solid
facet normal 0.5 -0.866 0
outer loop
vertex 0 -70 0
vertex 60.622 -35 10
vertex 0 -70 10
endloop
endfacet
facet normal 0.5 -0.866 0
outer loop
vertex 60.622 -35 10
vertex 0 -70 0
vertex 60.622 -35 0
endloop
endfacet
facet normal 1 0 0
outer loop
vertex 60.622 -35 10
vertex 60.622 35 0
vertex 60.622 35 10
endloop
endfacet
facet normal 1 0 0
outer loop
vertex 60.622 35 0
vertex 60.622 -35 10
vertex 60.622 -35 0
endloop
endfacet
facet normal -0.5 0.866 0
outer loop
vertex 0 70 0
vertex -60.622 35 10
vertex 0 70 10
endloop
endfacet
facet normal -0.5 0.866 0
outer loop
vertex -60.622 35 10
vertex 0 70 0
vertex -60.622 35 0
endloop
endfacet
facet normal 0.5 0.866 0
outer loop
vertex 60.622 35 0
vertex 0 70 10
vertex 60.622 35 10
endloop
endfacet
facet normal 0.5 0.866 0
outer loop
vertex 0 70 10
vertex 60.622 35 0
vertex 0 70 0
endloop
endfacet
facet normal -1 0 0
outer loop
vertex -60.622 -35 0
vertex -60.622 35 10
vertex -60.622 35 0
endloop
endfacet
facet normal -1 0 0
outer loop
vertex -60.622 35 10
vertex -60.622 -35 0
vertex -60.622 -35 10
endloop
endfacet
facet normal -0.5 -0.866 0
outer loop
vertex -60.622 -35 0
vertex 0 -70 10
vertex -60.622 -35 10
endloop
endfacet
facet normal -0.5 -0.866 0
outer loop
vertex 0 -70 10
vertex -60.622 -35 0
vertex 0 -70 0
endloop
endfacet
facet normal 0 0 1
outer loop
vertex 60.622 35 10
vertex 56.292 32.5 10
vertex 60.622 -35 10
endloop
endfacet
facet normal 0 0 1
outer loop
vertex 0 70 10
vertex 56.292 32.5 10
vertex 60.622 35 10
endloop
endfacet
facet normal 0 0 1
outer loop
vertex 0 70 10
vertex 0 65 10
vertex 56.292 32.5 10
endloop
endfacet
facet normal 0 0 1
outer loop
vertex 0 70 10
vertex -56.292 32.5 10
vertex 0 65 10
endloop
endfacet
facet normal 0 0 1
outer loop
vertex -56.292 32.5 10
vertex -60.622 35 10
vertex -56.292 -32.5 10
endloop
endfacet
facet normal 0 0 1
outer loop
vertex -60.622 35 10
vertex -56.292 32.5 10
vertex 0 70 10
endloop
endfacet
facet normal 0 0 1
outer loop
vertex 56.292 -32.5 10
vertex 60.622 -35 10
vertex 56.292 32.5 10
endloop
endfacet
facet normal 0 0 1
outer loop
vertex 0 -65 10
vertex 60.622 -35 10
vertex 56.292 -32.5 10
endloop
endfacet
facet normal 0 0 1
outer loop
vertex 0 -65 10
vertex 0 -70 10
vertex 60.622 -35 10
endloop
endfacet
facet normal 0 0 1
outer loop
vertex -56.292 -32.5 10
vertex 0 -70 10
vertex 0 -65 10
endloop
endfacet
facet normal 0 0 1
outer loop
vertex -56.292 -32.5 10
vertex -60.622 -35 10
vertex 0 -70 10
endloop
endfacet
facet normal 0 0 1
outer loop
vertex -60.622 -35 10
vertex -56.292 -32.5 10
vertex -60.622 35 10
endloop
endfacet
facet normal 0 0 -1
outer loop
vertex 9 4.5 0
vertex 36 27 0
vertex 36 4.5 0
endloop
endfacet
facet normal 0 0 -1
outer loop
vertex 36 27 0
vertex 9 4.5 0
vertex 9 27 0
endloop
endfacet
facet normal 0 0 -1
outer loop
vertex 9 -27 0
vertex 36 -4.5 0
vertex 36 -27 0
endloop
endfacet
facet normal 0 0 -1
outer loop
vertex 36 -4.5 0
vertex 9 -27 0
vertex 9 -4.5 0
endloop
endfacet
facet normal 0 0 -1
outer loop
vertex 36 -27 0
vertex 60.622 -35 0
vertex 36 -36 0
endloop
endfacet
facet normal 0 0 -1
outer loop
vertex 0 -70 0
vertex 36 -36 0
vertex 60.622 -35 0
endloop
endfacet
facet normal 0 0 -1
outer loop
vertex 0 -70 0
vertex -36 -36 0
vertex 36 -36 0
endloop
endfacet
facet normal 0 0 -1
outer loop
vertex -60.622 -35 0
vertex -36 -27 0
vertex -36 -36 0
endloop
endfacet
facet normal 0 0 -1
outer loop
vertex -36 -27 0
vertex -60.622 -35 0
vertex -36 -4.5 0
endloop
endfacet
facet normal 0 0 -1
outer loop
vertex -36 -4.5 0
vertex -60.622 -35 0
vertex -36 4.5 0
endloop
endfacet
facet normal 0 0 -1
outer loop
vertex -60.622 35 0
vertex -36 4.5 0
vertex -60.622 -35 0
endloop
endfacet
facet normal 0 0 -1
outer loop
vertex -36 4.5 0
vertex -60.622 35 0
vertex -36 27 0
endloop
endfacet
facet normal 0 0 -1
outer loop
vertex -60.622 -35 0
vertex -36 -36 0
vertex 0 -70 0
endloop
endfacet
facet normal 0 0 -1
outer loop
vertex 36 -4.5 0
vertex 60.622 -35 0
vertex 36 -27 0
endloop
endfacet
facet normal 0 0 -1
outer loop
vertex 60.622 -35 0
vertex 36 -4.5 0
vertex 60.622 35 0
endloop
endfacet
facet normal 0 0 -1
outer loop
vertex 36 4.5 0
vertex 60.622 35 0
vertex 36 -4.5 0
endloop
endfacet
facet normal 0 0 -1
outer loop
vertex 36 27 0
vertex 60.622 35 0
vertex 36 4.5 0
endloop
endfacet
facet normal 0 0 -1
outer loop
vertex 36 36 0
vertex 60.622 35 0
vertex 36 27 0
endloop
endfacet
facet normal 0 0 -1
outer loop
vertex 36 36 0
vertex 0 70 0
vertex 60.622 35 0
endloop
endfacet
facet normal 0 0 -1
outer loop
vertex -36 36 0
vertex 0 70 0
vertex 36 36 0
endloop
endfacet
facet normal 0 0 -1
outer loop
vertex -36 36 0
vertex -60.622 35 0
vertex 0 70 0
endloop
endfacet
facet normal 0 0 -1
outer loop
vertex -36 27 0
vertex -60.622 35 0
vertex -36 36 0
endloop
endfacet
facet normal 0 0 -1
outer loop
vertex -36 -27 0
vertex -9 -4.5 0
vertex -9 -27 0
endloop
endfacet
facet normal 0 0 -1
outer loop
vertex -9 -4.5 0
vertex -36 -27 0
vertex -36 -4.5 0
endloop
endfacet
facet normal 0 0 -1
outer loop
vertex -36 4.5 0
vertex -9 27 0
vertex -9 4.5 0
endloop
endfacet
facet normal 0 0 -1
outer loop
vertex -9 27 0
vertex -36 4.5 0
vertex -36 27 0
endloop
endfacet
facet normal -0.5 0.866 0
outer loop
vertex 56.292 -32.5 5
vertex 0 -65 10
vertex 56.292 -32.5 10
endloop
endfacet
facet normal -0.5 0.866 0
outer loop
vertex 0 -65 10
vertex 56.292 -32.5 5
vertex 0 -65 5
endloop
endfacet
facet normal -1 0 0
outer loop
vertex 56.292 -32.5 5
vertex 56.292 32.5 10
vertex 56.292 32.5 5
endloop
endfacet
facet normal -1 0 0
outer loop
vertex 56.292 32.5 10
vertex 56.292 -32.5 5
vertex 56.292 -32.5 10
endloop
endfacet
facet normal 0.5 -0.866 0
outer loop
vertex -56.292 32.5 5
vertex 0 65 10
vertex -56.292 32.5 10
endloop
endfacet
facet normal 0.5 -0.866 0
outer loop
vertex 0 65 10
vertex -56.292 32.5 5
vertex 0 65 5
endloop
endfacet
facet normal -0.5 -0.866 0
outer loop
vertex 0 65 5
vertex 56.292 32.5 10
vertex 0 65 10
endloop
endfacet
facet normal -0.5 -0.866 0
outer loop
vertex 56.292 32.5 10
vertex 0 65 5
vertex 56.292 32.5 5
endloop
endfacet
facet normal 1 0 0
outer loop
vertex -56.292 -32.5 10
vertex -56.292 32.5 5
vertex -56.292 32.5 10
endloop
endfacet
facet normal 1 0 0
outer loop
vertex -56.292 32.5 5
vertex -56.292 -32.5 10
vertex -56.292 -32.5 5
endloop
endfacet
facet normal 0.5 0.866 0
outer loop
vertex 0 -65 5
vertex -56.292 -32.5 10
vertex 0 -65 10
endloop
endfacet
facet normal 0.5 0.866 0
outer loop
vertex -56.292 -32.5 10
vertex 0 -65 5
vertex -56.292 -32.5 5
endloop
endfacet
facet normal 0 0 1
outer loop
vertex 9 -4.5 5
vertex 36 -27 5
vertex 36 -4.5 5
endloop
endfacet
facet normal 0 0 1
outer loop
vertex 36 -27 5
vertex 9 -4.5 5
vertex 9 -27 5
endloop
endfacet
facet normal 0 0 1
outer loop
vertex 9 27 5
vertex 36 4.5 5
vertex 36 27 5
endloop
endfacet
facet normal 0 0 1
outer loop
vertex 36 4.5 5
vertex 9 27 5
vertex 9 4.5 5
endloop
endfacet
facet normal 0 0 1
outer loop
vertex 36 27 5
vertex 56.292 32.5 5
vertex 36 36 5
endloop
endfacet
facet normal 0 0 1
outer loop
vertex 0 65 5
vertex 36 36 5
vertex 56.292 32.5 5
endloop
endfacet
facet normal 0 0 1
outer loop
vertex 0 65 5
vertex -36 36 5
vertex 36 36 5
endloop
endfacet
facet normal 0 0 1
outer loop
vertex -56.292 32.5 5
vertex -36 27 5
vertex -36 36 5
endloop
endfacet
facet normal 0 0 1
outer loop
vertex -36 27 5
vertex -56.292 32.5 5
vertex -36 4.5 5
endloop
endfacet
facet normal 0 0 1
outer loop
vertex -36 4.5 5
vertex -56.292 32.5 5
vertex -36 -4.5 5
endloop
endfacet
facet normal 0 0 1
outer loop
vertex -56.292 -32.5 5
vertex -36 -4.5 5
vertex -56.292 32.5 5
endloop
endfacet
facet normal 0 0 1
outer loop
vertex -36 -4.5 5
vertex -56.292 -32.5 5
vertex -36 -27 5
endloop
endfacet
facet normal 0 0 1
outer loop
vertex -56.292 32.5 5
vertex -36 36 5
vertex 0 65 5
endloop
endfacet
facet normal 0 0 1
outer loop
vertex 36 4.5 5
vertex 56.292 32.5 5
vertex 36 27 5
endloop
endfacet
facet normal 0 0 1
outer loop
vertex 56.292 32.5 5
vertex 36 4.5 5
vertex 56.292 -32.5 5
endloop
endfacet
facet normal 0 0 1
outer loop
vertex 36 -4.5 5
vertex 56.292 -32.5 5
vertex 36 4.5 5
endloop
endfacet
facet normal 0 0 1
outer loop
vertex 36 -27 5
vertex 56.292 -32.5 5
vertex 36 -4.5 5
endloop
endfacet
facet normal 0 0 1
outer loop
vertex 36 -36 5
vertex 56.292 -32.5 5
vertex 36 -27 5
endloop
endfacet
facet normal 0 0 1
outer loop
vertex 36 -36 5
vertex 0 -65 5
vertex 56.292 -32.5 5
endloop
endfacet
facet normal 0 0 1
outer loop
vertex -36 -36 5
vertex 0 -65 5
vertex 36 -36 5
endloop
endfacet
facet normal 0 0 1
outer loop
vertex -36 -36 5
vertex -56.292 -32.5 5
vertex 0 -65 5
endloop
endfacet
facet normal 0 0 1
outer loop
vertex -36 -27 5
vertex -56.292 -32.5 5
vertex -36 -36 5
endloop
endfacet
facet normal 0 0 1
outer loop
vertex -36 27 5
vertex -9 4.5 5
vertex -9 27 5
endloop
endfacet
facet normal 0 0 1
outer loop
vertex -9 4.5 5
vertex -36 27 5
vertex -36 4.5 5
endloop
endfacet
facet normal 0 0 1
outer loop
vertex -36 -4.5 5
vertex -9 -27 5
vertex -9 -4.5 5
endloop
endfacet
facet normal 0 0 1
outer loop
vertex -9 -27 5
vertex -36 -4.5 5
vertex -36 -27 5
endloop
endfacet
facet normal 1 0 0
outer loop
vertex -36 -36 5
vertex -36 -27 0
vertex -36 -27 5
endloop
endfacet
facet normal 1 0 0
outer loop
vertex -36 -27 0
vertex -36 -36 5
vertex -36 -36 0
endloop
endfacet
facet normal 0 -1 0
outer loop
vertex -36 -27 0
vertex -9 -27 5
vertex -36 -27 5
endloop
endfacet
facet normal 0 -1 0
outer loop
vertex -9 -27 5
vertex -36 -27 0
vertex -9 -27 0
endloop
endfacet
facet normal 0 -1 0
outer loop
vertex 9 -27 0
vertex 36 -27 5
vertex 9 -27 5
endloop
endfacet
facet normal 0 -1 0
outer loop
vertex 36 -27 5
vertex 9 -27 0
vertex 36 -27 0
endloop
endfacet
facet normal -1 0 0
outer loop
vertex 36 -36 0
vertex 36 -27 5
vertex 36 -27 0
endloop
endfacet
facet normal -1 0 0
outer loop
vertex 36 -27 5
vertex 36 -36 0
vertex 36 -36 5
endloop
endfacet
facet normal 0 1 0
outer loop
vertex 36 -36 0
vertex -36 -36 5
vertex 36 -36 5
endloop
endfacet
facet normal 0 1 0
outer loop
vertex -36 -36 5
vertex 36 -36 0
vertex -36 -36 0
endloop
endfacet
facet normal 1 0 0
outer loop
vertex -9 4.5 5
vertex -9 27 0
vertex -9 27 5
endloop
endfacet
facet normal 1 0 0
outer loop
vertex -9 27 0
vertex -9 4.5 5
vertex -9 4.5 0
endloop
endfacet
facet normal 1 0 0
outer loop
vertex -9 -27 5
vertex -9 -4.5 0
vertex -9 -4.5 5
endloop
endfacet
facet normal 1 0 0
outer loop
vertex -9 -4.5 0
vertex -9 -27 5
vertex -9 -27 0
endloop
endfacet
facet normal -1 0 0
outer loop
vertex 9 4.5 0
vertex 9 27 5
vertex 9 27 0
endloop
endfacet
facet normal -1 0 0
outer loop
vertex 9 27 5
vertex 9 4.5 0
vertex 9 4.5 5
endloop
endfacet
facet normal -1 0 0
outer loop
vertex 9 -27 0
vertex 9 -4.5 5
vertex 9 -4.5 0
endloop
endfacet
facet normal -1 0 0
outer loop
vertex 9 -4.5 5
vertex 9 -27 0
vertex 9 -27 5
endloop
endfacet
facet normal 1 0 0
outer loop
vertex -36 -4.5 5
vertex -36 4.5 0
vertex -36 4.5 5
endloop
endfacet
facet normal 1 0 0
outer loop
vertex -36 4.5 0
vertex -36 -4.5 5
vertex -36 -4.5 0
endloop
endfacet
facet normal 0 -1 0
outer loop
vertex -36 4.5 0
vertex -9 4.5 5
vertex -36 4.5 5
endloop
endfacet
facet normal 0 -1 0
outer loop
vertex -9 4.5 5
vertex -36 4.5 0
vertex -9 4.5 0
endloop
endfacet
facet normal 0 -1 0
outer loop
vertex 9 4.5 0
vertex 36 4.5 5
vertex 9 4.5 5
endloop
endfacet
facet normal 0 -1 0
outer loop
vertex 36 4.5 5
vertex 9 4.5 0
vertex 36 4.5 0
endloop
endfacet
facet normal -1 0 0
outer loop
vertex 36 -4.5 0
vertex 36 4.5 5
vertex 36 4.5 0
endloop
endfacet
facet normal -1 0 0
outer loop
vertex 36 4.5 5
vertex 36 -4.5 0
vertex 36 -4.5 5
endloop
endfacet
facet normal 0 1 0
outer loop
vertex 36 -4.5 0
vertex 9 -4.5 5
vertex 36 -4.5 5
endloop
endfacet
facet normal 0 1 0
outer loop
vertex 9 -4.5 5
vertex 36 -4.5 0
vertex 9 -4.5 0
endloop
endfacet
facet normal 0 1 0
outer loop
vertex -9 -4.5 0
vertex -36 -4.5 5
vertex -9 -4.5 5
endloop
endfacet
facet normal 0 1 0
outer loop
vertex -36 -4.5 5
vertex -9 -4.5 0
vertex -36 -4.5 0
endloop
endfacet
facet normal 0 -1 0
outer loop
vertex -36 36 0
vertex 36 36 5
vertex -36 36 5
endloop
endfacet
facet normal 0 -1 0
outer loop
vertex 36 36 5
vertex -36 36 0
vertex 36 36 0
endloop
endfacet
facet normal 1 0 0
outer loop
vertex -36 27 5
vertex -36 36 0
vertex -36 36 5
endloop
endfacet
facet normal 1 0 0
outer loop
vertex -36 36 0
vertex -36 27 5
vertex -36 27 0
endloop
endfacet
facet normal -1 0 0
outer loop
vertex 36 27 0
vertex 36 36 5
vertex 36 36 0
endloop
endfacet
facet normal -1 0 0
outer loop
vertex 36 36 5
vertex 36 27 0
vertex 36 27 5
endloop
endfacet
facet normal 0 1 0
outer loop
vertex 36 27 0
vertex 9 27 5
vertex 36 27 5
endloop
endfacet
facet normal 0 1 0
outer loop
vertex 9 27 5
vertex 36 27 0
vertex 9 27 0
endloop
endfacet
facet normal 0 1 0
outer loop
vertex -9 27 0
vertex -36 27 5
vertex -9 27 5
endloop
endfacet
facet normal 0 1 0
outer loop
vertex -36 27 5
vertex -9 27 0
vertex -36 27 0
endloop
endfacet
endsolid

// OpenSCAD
// Spacelab hexagons riddle
hex_radius=70;
hex_height=10;
hex_frame_height=5;
hex_frame_width=5;
display_digit=3;
digit_scale=4.5;

ptSegment = [                                                                   
    [ [-0, 0], [-8, 0], [-8, 2], [-0, 2] ],                    
    [ [-6, 0], [-6, 8], [-8, 8], [-8, 0] ],                    
    [ [-0, 0], [-0, 8], [-2, 8], [-2, 0] ],                    
    [ [-0, 7], [-0, 9], [-8, 9], [-8, 7] ],                    
    [ [-6, 8], [-6, 16], [-8, 16], [-8, 8] ],                    
    [ [-0, 8], [-0, 16], [-2, 16], [-2, 8] ],                    
    [ [-0, 14], [-8, 14], [-8, 16], [-0, 16] ],                    
]; 

fSevenSegment = [
    [1,1,1,0,1,1,1],                // 0
    [0,0,1,0,0,1,0],                // 1
    [1,1,0,1,0,1,1],                // 2
    [1,0,1,1,0,1,1],                // 3
    [0,0,1,1,1,1,0],                // 4
    [1,0,1,1,1,0,1],                // 5
    [1,1,1,1,1,0,1],                // 6
    [0,0,1,0,0,1,1],                // 7
    [1,1,1,1,1,1,1],                // 8
    [1,0,1,1,1,1,1]                 // 9
];

module DisplayMirroredDigit(number, scaling, height) {
    for (iSeg = [0:6]) {
        if (fSevenSegment[number][iSeg] > 0) {
            linear_extrude(height=height)
            scale([scaling, scaling, scaling]){
                translate([0, -8]){
                    mirror([1, 0, 0])
                    polygon(points=ptSegment[iSeg]);
                    polygon(points=ptSegment[iSeg]);
                }
            }
        }
    }
}

// Base shape
module HexagonBase(r, height, frame_height, frame_width){

    rotate([0,0,30])
    difference() {
        cylinder($fn=6, r=r, h=height);
        translate([0, 0, frame_height]) {
            cylinder($fn=6, r = (r-frame_width), h=frame_height);
        }
    }
}

difference() {
    HexagonBase(hex_radius, hex_height, hex_frame_height, hex_frame_width);
    DisplayMirroredDigit(display_digit, digit_scale, hex_height);
}
